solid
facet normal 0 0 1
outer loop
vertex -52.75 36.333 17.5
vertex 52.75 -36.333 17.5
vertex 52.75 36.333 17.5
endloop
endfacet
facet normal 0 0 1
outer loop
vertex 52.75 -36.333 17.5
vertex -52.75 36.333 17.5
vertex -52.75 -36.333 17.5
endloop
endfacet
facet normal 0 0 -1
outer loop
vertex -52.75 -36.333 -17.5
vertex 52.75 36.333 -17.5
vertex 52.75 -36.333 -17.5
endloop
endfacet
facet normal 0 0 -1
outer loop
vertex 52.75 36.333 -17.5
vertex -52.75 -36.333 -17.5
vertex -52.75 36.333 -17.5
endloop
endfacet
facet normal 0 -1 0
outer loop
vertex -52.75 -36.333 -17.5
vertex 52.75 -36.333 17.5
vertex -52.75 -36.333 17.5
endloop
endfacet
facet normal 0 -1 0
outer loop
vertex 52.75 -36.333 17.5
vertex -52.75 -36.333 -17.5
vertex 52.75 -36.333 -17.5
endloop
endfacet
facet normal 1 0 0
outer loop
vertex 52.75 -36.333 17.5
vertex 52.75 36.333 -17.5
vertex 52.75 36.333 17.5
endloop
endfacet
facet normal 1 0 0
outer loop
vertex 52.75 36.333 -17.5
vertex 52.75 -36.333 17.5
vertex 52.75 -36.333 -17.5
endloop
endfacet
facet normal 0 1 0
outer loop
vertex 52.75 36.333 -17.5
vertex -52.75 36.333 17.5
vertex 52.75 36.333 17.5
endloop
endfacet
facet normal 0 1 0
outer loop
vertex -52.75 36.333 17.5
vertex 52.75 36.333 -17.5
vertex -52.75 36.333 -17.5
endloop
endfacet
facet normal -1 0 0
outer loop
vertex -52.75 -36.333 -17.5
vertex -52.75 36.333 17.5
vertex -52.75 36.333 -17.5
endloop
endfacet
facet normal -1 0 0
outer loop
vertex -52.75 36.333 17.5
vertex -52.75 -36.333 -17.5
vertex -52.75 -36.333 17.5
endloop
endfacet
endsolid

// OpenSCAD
//Width of draws in printer room; 633.
//Depth of draw in printer room; 436.

Width = 633;
Depth = 436;

cube([Width/6, Depth/6, 35],true);
